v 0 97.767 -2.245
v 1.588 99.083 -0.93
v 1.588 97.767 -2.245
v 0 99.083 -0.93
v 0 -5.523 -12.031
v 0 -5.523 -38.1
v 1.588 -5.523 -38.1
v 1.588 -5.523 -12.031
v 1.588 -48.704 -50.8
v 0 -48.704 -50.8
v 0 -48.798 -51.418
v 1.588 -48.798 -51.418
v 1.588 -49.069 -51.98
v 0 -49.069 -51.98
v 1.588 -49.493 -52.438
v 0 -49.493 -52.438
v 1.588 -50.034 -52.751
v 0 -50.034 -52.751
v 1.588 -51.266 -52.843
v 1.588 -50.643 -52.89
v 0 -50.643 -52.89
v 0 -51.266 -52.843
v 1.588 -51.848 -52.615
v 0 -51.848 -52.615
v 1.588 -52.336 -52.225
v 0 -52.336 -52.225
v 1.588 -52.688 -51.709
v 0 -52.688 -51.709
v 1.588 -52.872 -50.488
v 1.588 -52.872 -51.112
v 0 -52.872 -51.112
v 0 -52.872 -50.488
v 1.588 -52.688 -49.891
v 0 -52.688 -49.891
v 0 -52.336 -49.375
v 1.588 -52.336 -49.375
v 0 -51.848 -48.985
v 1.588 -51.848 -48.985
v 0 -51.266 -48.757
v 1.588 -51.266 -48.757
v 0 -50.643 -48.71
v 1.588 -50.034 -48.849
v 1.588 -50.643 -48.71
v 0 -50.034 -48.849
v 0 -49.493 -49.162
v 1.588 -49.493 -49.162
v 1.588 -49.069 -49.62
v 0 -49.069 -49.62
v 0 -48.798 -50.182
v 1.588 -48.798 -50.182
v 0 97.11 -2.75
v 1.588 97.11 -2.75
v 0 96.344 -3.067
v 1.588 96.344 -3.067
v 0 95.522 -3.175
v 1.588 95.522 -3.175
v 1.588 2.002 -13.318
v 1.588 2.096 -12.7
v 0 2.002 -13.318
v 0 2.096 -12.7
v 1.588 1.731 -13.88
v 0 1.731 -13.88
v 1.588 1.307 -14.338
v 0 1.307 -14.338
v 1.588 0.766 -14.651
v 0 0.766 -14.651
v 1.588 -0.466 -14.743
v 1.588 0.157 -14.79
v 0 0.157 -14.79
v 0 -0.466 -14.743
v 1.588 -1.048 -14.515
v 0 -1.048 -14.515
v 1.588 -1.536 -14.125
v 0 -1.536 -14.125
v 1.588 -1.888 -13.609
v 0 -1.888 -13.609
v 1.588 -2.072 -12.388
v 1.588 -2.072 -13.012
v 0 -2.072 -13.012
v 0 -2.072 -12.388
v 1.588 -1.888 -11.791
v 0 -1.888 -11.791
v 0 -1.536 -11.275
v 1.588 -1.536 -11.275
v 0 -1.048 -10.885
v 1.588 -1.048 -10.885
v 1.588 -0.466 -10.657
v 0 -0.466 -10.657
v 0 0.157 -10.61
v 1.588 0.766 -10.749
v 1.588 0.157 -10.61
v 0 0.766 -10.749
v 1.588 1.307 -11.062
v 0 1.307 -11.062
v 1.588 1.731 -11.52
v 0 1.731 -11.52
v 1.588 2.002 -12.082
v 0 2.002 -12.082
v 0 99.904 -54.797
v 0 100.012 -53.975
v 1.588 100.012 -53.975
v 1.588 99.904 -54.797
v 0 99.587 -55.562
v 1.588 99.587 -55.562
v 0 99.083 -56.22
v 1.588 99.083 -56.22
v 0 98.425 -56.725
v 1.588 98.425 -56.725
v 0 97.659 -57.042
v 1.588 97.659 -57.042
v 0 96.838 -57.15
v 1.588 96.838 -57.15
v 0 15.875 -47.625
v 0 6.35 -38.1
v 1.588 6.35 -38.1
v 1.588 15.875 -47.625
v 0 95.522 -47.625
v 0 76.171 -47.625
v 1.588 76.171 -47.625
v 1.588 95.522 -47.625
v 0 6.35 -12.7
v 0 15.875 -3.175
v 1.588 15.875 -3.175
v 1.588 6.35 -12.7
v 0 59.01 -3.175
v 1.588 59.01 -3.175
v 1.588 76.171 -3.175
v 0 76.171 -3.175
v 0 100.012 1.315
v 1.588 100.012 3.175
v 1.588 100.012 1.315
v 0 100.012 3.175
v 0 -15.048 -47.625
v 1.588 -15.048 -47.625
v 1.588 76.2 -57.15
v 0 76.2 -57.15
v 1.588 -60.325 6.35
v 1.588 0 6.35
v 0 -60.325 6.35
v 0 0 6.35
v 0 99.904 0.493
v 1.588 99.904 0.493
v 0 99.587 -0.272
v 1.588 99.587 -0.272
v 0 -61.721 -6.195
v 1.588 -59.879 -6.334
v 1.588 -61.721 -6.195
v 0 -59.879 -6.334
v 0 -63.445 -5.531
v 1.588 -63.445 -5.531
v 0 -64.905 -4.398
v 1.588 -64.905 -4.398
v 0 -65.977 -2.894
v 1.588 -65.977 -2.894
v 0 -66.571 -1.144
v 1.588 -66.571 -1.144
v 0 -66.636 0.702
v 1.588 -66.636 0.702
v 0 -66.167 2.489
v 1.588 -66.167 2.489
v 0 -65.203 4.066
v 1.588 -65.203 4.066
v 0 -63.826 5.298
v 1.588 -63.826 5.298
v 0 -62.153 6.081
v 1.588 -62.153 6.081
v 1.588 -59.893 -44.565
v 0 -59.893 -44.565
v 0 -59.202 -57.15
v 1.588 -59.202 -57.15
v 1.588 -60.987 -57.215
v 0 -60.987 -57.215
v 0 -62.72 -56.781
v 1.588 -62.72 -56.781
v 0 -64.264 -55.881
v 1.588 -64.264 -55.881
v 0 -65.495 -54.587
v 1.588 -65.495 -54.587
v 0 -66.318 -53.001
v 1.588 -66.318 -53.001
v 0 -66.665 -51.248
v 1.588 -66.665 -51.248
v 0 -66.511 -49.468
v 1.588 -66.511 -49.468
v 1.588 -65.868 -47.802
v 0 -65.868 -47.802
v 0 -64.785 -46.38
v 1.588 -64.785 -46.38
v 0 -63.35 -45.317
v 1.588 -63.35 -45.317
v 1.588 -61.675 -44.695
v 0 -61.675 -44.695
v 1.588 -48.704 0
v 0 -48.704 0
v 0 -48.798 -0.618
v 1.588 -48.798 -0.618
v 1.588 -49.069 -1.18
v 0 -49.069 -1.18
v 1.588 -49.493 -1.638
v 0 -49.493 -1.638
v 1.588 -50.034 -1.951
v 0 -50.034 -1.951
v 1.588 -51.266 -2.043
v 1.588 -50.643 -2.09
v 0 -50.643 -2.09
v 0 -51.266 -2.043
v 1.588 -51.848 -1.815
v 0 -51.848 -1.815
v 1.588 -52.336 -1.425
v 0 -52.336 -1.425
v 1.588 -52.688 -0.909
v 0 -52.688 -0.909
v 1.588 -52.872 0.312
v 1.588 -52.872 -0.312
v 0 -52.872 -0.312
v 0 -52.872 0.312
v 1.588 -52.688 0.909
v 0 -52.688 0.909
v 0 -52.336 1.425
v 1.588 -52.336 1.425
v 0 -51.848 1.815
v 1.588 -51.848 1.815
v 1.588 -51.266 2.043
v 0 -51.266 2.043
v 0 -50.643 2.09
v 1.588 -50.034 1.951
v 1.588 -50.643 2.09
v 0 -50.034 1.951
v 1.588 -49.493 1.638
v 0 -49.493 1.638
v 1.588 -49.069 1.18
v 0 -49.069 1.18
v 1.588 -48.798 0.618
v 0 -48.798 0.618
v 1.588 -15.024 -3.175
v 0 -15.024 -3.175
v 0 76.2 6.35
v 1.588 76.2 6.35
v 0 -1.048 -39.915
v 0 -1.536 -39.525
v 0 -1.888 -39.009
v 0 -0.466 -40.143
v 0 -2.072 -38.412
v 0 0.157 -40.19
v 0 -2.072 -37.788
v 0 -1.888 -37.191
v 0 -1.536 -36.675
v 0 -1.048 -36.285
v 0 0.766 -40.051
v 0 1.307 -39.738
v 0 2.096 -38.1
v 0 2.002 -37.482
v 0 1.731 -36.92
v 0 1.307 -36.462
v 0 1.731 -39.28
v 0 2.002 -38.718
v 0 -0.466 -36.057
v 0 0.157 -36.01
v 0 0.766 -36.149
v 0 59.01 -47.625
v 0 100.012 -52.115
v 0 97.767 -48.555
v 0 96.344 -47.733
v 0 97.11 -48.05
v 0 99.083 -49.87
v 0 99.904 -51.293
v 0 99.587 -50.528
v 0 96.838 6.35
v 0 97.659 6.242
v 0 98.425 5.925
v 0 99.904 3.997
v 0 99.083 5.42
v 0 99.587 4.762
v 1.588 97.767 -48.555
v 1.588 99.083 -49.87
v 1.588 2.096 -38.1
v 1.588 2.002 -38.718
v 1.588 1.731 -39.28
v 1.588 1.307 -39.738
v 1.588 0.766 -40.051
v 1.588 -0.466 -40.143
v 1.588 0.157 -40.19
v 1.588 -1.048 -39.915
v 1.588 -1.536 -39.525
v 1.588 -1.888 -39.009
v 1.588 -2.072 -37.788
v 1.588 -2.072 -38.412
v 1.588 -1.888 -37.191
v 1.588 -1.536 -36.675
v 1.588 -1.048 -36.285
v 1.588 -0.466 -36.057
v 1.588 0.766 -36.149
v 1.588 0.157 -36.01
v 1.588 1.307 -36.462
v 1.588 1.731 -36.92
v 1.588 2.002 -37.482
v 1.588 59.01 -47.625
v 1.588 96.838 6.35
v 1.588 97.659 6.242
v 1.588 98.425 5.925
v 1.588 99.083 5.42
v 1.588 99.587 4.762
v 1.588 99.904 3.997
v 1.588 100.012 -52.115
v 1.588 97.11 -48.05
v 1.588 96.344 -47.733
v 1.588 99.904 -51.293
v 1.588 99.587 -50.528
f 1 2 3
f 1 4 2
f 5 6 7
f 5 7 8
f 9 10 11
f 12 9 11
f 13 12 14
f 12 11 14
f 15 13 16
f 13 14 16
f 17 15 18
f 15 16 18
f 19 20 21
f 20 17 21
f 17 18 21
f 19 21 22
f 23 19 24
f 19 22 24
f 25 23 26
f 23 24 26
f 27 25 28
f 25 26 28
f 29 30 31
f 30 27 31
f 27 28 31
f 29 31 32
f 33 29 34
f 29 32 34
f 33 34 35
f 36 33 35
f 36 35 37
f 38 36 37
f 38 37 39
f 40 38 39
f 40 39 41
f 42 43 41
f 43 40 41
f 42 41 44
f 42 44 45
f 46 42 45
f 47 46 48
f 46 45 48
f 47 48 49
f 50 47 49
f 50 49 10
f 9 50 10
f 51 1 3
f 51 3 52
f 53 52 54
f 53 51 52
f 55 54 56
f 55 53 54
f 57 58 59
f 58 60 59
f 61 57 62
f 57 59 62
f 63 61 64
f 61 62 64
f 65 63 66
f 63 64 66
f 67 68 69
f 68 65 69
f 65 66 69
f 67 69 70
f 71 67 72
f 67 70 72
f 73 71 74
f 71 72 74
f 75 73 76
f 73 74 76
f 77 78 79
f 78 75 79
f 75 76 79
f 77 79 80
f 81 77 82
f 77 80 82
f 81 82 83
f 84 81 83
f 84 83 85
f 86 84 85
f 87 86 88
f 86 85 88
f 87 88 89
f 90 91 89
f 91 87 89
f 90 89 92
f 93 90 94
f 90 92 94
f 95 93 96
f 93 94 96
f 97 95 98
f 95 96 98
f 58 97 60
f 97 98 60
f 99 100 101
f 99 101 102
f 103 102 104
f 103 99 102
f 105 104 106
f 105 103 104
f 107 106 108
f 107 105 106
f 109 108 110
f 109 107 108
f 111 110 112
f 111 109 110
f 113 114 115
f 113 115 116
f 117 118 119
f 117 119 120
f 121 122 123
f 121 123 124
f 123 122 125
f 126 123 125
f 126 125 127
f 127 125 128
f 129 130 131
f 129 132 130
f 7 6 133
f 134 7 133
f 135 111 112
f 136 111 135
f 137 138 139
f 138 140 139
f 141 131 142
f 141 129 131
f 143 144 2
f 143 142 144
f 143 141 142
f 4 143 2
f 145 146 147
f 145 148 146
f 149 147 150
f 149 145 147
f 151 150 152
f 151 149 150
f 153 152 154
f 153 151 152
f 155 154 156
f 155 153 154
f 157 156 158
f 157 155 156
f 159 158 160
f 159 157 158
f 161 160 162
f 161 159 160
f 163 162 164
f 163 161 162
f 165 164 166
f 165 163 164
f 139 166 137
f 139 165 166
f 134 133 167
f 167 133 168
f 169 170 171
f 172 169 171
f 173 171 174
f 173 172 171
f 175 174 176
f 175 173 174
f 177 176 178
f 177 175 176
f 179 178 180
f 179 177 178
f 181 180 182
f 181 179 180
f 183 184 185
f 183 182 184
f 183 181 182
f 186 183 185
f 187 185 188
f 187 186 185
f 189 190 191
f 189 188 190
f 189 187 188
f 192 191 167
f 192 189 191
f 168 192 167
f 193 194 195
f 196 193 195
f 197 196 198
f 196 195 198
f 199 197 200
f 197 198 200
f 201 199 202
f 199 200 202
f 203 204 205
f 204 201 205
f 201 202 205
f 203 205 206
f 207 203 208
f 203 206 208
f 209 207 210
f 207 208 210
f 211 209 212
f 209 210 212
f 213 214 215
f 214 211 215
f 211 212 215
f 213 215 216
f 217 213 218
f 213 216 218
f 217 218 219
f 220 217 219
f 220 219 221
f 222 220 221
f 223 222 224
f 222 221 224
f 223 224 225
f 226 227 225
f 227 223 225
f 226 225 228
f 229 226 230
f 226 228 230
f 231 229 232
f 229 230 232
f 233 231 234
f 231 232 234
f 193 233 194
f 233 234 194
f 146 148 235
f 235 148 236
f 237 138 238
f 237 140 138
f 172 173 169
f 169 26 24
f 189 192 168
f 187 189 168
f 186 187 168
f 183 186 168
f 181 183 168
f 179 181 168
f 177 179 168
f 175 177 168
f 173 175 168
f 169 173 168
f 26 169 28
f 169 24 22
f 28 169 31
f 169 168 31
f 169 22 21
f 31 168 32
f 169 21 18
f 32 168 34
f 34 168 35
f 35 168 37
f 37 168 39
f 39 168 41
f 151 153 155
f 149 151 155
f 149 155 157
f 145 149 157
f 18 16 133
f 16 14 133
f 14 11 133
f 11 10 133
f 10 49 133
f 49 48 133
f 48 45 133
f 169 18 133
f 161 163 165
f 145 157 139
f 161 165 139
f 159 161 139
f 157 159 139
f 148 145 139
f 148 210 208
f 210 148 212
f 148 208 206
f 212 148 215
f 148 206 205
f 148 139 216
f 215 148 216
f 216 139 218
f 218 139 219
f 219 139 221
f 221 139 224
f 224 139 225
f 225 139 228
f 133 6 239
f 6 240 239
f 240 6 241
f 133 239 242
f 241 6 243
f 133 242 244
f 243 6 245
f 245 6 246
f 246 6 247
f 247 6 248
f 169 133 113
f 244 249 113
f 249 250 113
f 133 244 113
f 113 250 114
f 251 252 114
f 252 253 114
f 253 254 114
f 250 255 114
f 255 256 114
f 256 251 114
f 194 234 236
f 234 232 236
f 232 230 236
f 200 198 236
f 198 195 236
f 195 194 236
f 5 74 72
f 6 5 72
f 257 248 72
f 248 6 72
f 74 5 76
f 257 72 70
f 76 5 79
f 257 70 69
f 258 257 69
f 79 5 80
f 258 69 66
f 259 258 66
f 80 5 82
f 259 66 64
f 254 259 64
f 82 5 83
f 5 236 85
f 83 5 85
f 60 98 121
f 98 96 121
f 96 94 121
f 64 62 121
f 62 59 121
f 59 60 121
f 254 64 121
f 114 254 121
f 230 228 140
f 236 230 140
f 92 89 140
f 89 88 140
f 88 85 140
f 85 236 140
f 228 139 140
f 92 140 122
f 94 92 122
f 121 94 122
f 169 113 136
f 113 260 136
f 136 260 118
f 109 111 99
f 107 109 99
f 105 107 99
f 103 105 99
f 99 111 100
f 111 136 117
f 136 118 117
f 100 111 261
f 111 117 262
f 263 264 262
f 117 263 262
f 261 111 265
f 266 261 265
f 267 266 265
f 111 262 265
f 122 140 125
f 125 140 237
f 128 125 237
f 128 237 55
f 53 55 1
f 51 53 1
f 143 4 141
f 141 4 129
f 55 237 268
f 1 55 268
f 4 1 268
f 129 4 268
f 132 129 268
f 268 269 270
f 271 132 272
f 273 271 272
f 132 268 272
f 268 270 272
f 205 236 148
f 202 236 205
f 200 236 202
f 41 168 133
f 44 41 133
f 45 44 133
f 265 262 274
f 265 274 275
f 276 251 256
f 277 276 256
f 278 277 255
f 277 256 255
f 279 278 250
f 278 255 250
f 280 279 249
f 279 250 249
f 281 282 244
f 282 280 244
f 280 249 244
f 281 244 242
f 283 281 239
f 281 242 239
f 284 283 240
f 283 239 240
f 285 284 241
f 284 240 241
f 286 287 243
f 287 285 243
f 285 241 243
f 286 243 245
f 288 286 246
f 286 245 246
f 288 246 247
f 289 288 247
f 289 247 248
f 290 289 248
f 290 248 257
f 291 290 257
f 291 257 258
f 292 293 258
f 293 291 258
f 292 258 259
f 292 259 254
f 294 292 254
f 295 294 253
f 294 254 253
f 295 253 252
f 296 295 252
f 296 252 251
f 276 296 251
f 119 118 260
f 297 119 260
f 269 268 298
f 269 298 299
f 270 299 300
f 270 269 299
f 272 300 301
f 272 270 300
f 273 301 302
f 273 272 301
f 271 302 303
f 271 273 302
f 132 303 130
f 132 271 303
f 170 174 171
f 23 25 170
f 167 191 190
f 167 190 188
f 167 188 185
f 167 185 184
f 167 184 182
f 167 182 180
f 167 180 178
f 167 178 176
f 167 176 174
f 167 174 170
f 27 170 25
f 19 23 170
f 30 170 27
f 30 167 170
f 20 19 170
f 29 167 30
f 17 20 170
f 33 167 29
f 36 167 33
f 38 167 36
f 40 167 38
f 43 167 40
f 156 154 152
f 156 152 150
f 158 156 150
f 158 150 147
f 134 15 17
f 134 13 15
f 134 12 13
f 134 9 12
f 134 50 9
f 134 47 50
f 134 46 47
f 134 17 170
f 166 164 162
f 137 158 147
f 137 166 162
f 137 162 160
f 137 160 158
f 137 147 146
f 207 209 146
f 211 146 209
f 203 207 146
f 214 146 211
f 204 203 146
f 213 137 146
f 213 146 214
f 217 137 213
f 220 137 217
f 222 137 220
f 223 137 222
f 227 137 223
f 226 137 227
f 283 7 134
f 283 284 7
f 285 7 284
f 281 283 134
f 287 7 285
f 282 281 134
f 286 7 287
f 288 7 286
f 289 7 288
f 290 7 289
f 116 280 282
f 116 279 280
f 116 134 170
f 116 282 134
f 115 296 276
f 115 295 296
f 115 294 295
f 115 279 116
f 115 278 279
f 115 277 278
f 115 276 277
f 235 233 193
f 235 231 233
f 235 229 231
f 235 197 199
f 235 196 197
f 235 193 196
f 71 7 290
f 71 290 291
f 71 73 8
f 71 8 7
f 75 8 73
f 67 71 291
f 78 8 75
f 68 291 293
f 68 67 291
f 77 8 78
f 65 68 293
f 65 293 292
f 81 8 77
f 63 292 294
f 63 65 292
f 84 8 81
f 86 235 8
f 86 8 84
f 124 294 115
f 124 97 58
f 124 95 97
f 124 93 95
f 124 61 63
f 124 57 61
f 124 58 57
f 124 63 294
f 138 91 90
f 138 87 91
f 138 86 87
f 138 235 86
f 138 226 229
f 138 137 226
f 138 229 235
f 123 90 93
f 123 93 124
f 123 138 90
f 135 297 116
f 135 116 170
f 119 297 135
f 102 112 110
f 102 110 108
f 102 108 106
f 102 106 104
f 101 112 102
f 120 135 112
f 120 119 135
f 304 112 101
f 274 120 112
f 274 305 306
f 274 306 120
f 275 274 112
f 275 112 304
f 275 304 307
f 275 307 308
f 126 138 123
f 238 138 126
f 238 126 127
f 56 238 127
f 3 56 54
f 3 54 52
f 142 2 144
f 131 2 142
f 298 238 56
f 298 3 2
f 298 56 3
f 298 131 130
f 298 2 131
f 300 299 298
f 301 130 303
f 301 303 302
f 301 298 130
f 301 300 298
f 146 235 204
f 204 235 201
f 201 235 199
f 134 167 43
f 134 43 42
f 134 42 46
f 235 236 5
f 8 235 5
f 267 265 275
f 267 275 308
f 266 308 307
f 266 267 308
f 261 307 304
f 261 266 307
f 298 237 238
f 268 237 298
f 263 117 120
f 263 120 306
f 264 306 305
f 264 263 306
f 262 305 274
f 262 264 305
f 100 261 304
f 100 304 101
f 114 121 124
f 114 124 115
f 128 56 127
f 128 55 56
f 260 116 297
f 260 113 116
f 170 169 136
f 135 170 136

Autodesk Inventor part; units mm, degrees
ref_plane "YZ Plane" through (0, 0, 0) normal (1, 0, 0) x (0, 1, 0)
ref_plane "XZ Plane" through (0, 0, 0) normal (0, 1, 0) x (-1, 0, 0)
ref_plane "XY Plane" through (0, 0, 0) normal (0, 0, 1) x (1, 0, 0)
sketch "Sketch1" plane through (0, 0, 0) normal (1, 0, 0) x (0, 1, 0)
  circle A0 centre (0, -12.7) radius 2.0955
  line L0 (0, 6.35) -> (76.2, 6.35)
  circle A1 centre (0, -38.1) radius 2.0955
  line L1 (-59.2019, -57.15) -> (76.2, -57.15)
  line L2 (76.2, 6.35) -> (96.8375, 6.35)
  line L3 (100.0125, 3.175) -> (100.0125, 1.3151)
  line L4 (95.5224, -3.175) -> (76.1708, -3.175)
  line L5 (76.1708, -47.625) -> (95.5224, -47.625)
  line L6 (100.0125, -52.1151) -> (100.0125, -53.975)
  line L7 (96.8375, -57.15) -> (76.2, -57.15)
  line L8 (99.0826, -0.9299) -> (97.7674, -2.2451)
  line L9 (97.7674, -48.5549) -> (99.0826, -49.8701)
  arc A2 (100.0125, 3.175) -> (96.8375, 6.35) centre (96.8375, 3.175) ccw
  arc A3 (99.0826, -0.9299) -> (100.0125, 1.3151) centre (96.8375, 1.3151) ccw
  arc A4 (95.5224, -3.175) -> (97.7674, -2.2451) centre (95.5224, 0) ccw
  arc A5 (97.7674, -48.5549) -> (95.5224, -47.625) centre (95.5224, -50.8) ccw
  arc A6 (100.0125, -52.1151) -> (99.0826, -49.8701) centre (96.8375, -52.1151) ccw
  arc A7 (96.8375, -57.15) -> (100.0125, -53.975) centre (96.8375, -53.975) ccw
  line L10 (59.0099, -3.175) -> (76.1708, -3.175)
  line L11 (76.1708, -47.625) -> (59.0099, -47.625)
  line L12 (0, 6.35) -> (-60.325, 6.35)
  arc A8 (-60.325, 6.35) -> (-59.8788, -6.3343) centre (-60.325, 0) ccw
  arc A9 (-59.8927, -44.5648) -> (-59.2019, -57.15) centre (-60.325, -50.9001) ccw
  line L13 (6.35, -12.7) -> (6.35, -38.1)
  line L14 (-5.5228, -38.1) -> (-5.5228, -12.0308)
  line L15 (-59.8788, -6.3343) -> (-15.0243, -3.175)
  line L16 (15.875, -3.175) -> (59.0099, -3.175)
  line L17 (15.875, -47.625) -> (59.0099, -47.625)
  line L18 (15.875, -3.175) -> (6.35, -12.7)
  line L19 (6.35, -38.1) -> (15.875, -47.625)
  line L20 (-5.5228, -38.1) -> (-15.0478, -47.625)
  line L21 (-15.0243, -3.175) -> (-5.5228, -12.0308)
  line L22 (-15.0478, -47.625) -> (-59.8927, -44.5648)
  circle A10 centre (-50.8, 0) radius 2.0955
  circle A11 centre (-50.8, -50.8) radius 2.0955
  point P0 (5.4993, -3.175)
  point P1 (0, -57.15)
  point P2 (5.4993, -47.625)
  point P3 (100.0125, -3.175)
  point P4 (100.0125, -47.625)
  point P5 (100.0125, -57.15)
  point P6 (100.0125, 0)
  point P7 (96.8375, -3.175)
  point P8 (96.8375, -47.625)
  point P9 (100.0125, -50.8)
  point P10 (38.1, 6.35)
  point P11 (-5.5228, -2.5058)
  point P12 (-5.5228, -47.625)
  point P13 (85.8466, -3.175)
  point P14 (6.35, -3.175)
  point P15 (6.35, -47.625)
  point P16 (0, 0)
  dimension "d0" = 4.191
  dimension "d6" = 4.191
  dimension "d15" = 3.175
  dimension "d16" = 3.175
  dimension "d17" = 3.175
  dimension "d18" = 3.175
  dimension "d19" = 3.175
  dimension "d29" = 9.525
  dimension "d30" = 9.525
  dimension "d31" = 9.525
  dimension "d32" = 9.525
  dimension "d34" = 9.525
  dimension "d35" = 9.525
  dimension "d36" = 9.525
  dimension "d37" = 9.525
  dimension "d38" = 9.525
  dimension "d39" = 12.7
  dimension "d40" = 12.7
  dimension "d41" = 4.191
  dimension "d42" = 4.191
  dimension "d43" = 12.7
  dimension "d44" = 0
  dimension "d45" = 25.4
extrude "Extrusion1" add sketch "Sketch1" along normal blind 1.5875
equation "\"d15\" = d7"
equation "\"d16\" = d15"
equation "\"d17\" = d7"
equation "\"d18\" = d17"
equation "\"d32\" = d31"
equation "\"d34\" = d33"
equation "\"d35\" = d31"
equation "\"d36\" = d35"
equation "\"d37\" = d31"
equation "\"d38\" = d37"
equation "\"d33\" = d31"
equation "\"d7\" = 3.175"
properties part number "Ring Guard" material "Acetal Resin, White"
